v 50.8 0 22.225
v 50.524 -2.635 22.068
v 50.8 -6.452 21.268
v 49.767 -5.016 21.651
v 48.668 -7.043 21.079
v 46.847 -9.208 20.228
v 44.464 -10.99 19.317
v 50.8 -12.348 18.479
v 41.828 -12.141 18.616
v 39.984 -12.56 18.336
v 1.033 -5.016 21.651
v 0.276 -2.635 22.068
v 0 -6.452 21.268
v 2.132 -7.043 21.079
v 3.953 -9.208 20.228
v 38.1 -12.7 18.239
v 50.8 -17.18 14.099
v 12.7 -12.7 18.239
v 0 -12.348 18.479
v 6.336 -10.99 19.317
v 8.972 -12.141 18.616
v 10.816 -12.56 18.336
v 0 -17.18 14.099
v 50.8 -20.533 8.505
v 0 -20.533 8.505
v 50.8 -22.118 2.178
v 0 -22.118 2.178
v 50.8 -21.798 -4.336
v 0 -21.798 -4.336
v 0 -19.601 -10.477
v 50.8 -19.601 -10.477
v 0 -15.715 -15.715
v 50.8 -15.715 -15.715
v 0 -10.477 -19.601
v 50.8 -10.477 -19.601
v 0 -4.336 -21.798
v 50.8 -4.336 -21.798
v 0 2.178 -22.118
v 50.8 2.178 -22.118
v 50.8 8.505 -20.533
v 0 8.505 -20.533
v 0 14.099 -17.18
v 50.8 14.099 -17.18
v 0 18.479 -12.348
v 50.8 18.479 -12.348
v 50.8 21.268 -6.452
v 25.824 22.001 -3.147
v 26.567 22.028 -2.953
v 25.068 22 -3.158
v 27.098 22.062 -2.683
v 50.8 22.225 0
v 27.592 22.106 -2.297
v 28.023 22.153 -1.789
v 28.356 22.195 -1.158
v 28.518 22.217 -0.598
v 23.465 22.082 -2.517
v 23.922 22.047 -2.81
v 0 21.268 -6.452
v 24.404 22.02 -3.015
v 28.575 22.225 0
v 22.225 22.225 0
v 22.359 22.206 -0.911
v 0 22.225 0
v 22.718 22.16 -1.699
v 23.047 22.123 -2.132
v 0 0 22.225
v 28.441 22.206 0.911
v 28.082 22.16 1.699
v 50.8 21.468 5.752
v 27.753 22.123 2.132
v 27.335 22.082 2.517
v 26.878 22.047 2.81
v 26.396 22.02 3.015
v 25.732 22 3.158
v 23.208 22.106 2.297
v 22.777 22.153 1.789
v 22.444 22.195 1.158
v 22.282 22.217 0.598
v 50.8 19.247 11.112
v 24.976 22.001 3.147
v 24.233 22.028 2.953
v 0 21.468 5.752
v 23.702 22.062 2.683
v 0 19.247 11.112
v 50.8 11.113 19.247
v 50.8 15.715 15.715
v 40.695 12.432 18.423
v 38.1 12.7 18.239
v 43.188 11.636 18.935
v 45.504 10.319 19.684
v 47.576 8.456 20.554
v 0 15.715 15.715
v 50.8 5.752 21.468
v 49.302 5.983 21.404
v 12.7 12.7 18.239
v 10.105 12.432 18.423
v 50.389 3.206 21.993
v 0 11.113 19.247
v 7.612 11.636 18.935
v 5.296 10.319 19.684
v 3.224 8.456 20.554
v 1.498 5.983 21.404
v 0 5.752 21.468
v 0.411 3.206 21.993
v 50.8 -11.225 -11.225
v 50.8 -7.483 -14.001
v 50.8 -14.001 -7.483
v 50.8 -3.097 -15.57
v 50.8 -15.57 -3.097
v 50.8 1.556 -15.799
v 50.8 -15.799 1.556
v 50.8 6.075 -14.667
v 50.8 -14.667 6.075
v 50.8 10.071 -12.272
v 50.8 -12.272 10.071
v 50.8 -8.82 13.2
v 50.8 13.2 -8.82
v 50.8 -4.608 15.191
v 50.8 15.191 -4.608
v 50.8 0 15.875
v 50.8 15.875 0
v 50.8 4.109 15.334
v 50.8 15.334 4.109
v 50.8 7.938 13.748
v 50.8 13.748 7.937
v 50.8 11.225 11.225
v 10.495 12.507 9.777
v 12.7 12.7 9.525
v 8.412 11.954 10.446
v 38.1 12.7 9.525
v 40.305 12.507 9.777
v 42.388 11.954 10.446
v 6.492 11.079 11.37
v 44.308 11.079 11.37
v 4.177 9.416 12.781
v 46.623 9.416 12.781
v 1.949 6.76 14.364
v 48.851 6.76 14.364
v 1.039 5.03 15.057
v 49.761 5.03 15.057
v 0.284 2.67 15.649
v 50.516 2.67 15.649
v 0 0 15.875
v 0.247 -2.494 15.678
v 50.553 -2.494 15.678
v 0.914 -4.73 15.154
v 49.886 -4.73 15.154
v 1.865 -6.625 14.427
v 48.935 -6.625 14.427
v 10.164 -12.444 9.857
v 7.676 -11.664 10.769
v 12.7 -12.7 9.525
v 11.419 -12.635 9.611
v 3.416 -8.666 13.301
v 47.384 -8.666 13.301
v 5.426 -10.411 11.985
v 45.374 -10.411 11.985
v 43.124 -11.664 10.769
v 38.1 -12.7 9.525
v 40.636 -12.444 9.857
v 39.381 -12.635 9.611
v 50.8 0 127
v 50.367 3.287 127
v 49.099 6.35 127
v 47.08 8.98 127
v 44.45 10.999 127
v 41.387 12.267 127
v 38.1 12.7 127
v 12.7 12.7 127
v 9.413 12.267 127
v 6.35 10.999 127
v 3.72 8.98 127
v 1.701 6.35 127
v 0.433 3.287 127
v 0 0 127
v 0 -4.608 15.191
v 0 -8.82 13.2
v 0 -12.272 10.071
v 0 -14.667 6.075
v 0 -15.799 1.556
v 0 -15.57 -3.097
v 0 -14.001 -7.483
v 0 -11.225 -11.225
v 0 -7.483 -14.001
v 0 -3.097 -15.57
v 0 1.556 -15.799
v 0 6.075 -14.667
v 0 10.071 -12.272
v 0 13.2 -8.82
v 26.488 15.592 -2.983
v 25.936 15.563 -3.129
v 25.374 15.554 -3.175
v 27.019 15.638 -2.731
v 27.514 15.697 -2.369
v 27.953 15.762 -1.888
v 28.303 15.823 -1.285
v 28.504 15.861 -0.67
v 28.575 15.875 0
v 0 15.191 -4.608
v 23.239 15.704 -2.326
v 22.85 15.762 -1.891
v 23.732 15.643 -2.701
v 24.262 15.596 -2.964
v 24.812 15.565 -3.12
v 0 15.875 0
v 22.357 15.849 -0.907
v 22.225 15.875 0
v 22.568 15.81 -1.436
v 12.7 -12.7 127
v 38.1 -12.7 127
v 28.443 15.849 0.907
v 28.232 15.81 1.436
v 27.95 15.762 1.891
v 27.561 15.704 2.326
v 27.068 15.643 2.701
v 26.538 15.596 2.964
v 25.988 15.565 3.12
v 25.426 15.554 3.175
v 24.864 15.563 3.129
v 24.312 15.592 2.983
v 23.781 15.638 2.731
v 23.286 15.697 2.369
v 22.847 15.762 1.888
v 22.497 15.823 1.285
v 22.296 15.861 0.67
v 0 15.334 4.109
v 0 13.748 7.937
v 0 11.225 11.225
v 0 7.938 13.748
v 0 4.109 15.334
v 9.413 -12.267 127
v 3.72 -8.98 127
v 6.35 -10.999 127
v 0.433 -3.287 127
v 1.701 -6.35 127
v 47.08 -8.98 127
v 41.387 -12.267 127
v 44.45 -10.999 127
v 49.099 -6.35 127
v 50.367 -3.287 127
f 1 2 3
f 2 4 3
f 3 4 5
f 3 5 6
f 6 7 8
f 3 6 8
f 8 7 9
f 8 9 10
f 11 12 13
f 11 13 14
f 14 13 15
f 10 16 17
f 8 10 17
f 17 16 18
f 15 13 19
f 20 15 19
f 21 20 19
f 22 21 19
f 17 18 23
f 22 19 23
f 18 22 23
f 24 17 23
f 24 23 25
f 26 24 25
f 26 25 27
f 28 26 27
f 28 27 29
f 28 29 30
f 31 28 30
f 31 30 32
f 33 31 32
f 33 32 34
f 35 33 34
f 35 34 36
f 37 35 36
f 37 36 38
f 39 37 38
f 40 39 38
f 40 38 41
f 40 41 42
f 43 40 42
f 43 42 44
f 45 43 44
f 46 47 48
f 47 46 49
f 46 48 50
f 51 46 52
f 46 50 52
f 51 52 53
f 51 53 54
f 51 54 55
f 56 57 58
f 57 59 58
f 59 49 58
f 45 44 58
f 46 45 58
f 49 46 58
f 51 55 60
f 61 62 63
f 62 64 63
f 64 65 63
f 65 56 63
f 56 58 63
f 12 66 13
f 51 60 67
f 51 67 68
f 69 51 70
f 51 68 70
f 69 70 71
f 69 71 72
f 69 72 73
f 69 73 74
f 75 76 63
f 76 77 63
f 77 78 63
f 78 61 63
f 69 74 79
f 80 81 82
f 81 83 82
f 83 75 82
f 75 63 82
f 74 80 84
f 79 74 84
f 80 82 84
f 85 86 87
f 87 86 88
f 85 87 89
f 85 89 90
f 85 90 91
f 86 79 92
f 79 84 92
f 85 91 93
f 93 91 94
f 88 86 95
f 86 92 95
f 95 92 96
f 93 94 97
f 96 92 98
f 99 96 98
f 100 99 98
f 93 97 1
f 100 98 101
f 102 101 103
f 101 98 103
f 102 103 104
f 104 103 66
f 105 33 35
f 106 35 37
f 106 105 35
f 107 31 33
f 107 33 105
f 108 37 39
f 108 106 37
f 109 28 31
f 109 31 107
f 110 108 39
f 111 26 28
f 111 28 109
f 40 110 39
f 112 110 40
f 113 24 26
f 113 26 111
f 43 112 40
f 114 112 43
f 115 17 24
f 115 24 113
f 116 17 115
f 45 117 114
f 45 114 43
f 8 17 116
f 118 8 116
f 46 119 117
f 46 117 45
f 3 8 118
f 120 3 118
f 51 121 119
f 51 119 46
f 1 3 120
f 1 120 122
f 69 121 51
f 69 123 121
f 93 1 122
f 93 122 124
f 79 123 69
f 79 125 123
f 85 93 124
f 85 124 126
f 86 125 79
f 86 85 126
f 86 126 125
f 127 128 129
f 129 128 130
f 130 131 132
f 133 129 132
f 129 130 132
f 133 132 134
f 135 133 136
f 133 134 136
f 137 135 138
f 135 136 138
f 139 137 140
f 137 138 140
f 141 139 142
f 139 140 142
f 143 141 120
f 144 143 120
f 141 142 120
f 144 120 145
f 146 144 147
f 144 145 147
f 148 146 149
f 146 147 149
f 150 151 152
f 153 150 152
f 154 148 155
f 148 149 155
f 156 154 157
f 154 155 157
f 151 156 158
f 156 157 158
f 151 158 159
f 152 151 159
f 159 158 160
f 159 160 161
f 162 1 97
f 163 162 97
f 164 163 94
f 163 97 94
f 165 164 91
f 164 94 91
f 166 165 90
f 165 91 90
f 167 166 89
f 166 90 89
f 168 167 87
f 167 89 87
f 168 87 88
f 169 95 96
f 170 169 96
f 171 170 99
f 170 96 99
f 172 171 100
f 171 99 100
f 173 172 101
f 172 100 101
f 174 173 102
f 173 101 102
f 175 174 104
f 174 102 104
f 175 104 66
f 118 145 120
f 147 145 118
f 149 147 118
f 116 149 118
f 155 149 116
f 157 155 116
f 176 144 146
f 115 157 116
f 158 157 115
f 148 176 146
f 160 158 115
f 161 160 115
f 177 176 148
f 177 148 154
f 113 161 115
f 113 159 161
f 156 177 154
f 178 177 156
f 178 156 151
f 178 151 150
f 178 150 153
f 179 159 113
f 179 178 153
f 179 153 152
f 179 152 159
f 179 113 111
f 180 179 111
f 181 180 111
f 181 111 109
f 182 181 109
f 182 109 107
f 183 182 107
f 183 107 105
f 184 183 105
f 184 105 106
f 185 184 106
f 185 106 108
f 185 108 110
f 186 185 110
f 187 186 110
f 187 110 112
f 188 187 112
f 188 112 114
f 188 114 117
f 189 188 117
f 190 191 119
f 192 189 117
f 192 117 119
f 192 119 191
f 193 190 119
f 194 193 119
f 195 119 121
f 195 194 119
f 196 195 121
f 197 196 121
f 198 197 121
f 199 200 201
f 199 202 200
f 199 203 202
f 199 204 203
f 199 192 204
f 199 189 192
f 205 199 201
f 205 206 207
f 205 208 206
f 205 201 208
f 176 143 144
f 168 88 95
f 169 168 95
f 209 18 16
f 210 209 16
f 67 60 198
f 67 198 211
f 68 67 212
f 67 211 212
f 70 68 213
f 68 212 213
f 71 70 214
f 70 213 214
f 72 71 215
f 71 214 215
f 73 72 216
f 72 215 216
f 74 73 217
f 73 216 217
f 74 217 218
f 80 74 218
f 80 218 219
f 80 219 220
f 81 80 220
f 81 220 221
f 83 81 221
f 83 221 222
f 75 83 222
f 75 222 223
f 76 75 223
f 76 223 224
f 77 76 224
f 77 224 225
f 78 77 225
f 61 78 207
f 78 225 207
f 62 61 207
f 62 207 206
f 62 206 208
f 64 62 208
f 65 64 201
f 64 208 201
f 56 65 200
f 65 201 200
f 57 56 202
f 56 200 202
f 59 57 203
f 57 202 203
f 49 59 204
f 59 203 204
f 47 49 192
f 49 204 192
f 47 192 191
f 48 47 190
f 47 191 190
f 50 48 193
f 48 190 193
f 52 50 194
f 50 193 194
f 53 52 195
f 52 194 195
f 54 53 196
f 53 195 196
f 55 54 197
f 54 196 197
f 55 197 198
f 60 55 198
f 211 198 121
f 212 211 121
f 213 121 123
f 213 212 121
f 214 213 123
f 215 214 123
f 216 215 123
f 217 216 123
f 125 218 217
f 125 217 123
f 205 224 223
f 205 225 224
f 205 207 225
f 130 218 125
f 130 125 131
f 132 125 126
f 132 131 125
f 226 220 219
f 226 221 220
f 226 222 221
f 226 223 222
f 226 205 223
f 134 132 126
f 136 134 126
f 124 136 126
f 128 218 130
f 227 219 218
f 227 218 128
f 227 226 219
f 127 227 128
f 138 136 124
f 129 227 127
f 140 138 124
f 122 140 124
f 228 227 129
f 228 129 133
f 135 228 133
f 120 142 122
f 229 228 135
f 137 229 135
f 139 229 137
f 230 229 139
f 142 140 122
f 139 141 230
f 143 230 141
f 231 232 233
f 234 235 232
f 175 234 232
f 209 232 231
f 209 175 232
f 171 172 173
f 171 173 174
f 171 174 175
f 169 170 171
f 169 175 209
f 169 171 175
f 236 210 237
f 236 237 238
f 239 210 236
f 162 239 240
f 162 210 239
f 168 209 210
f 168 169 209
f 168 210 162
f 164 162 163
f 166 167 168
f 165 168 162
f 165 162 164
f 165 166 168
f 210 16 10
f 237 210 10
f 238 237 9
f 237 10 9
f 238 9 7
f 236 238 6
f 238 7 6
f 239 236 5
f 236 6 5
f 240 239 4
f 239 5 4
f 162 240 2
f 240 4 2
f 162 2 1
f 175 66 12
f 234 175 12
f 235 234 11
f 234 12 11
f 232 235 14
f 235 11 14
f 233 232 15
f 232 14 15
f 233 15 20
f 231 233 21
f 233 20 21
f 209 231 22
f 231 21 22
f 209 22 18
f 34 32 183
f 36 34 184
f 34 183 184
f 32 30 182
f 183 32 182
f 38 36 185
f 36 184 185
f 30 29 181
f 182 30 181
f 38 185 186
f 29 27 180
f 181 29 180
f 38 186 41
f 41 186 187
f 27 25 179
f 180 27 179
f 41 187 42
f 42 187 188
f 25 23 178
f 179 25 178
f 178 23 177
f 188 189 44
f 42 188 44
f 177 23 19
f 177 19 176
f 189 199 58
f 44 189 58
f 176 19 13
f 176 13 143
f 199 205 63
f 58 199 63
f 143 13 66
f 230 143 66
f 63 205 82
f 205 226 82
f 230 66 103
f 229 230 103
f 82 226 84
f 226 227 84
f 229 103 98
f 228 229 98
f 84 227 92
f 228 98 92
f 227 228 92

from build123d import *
from build123d import SkipClean  # not in build123d's __all__

# Parameters (mm, degrees)
F0_R     = 22.225
F0_R_2   = 15.875
F1_DEPTH = 50.8
F2_R     = 3.175
F3_DEPTH = 37.592
F5_DEPTH = 127
F6_R     = 15.875
F7_DEPTH = 70.104


with BuildPart() as f1:
    # F0 (on Right) → F1 (new body)
    with BuildSketch(Plane.YZ):
        Circle(F0_R)
        Circle(F0_R_2, mode=Mode.SUBTRACT)
    extrude(amount=F1_DEPTH)

    # F2 (on Front) → F3 (cut)
    with BuildSketch(Plane.XZ):
        with Locations((25.4, 0)):
            Circle(F2_R)
    extrude(amount=-F3_DEPTH, mode=Mode.SUBTRACT)

    # F4 (on Top) → F5 (join)
    with BuildSketch(Plane.XY):
        with BuildLine():
            ThreePointArc((12.7, 12.7), (3.7197438789, 8.9802561211), (0, 0))
            Line((0, 0), (12.7, 0))
            Line((12.7, 0), (12.7, 12.7))
        make_face()
        with BuildLine():
            Line((12.7, 0), (0, 0))
            ThreePointArc((0, 0), (3.7197438789, -8.9802561211), (12.7, -12.7))
            Line((12.7, -12.7), (12.7, 0))
        make_face()
        with BuildLine():
            Line((12.7, 12.7), (12.7, 0))
            Line((12.7, 0), (25.4, 0))
            ThreePointArc((25.4, 0), (21.6802561211, 8.9802561211), (12.7, 12.7))
        make_face()
        with BuildLine():
            Line((25.4, 0), (12.7, 0))
            Line((12.7, 0), (12.7, -12.7))
            ThreePointArc((12.7, -12.7), (21.6802561211, -8.9802561211), (25.4, 0))
        make_face()
        with BuildLine():
            Line((38.1, 12.7), (12.7, 12.7))
            ThreePointArc((12.7, 12.7), (21.6802561211, 8.9802561211), (25.4, 0))
            ThreePointArc((25.4, 0), (29.1197438789, 8.9802561211), (38.1, 12.7))
        make_face()
        with BuildLine():
            ThreePointArc((25.4, 0), (21.6802561211, -8.9802561211), (12.7, -12.7))
            Line((12.7, -12.7), (38.1, -12.7))
            ThreePointArc((38.1, -12.7), (29.1197438789, -8.9802561211), (25.4, 0))
        make_face()
        with BuildLine():
            ThreePointArc((38.1, 12.7), (29.1197438789, 8.9802561211), (25.4, 0))
            Line((25.4, 0), (38.1, 0))
            Line((38.1, 0), (38.1, 12.7))
        make_face()
        with BuildLine():
            Line((38.1, 0), (25.4, 0))
            ThreePointArc((25.4, 0), (29.1197438789, -8.9802561211), (38.1, -12.7))
            Line((38.1, -12.7), (38.1, 0))
        make_face()
        with BuildLine():
            ThreePointArc((50.8, 0), (47.0802561211, 8.9802561211), (38.1, 12.7))
            Line((38.1, 12.7), (38.1, 0))
            Line((38.1, 0), (38.1, -12.7))
            ThreePointArc((38.1, -12.7), (47.0802561211, -8.9802561211), (50.8, 0))
        make_face()
    with SkipClean():  # cleaning this boolean's faces spoils the solid; the shape is the same uncleaned
        extrude(amount=F5_DEPTH)

    # F6 (on face) → F7 (cut)
    with BuildSketch(Plane.YZ.offset(50.8)):
        Circle(F6_R)
    with SkipClean():  # cleaning this boolean's faces spoils the solid; the shape is the same uncleaned
        extrude(amount=-F7_DEPTH, mode=Mode.SUBTRACT)


solid = f1.part
